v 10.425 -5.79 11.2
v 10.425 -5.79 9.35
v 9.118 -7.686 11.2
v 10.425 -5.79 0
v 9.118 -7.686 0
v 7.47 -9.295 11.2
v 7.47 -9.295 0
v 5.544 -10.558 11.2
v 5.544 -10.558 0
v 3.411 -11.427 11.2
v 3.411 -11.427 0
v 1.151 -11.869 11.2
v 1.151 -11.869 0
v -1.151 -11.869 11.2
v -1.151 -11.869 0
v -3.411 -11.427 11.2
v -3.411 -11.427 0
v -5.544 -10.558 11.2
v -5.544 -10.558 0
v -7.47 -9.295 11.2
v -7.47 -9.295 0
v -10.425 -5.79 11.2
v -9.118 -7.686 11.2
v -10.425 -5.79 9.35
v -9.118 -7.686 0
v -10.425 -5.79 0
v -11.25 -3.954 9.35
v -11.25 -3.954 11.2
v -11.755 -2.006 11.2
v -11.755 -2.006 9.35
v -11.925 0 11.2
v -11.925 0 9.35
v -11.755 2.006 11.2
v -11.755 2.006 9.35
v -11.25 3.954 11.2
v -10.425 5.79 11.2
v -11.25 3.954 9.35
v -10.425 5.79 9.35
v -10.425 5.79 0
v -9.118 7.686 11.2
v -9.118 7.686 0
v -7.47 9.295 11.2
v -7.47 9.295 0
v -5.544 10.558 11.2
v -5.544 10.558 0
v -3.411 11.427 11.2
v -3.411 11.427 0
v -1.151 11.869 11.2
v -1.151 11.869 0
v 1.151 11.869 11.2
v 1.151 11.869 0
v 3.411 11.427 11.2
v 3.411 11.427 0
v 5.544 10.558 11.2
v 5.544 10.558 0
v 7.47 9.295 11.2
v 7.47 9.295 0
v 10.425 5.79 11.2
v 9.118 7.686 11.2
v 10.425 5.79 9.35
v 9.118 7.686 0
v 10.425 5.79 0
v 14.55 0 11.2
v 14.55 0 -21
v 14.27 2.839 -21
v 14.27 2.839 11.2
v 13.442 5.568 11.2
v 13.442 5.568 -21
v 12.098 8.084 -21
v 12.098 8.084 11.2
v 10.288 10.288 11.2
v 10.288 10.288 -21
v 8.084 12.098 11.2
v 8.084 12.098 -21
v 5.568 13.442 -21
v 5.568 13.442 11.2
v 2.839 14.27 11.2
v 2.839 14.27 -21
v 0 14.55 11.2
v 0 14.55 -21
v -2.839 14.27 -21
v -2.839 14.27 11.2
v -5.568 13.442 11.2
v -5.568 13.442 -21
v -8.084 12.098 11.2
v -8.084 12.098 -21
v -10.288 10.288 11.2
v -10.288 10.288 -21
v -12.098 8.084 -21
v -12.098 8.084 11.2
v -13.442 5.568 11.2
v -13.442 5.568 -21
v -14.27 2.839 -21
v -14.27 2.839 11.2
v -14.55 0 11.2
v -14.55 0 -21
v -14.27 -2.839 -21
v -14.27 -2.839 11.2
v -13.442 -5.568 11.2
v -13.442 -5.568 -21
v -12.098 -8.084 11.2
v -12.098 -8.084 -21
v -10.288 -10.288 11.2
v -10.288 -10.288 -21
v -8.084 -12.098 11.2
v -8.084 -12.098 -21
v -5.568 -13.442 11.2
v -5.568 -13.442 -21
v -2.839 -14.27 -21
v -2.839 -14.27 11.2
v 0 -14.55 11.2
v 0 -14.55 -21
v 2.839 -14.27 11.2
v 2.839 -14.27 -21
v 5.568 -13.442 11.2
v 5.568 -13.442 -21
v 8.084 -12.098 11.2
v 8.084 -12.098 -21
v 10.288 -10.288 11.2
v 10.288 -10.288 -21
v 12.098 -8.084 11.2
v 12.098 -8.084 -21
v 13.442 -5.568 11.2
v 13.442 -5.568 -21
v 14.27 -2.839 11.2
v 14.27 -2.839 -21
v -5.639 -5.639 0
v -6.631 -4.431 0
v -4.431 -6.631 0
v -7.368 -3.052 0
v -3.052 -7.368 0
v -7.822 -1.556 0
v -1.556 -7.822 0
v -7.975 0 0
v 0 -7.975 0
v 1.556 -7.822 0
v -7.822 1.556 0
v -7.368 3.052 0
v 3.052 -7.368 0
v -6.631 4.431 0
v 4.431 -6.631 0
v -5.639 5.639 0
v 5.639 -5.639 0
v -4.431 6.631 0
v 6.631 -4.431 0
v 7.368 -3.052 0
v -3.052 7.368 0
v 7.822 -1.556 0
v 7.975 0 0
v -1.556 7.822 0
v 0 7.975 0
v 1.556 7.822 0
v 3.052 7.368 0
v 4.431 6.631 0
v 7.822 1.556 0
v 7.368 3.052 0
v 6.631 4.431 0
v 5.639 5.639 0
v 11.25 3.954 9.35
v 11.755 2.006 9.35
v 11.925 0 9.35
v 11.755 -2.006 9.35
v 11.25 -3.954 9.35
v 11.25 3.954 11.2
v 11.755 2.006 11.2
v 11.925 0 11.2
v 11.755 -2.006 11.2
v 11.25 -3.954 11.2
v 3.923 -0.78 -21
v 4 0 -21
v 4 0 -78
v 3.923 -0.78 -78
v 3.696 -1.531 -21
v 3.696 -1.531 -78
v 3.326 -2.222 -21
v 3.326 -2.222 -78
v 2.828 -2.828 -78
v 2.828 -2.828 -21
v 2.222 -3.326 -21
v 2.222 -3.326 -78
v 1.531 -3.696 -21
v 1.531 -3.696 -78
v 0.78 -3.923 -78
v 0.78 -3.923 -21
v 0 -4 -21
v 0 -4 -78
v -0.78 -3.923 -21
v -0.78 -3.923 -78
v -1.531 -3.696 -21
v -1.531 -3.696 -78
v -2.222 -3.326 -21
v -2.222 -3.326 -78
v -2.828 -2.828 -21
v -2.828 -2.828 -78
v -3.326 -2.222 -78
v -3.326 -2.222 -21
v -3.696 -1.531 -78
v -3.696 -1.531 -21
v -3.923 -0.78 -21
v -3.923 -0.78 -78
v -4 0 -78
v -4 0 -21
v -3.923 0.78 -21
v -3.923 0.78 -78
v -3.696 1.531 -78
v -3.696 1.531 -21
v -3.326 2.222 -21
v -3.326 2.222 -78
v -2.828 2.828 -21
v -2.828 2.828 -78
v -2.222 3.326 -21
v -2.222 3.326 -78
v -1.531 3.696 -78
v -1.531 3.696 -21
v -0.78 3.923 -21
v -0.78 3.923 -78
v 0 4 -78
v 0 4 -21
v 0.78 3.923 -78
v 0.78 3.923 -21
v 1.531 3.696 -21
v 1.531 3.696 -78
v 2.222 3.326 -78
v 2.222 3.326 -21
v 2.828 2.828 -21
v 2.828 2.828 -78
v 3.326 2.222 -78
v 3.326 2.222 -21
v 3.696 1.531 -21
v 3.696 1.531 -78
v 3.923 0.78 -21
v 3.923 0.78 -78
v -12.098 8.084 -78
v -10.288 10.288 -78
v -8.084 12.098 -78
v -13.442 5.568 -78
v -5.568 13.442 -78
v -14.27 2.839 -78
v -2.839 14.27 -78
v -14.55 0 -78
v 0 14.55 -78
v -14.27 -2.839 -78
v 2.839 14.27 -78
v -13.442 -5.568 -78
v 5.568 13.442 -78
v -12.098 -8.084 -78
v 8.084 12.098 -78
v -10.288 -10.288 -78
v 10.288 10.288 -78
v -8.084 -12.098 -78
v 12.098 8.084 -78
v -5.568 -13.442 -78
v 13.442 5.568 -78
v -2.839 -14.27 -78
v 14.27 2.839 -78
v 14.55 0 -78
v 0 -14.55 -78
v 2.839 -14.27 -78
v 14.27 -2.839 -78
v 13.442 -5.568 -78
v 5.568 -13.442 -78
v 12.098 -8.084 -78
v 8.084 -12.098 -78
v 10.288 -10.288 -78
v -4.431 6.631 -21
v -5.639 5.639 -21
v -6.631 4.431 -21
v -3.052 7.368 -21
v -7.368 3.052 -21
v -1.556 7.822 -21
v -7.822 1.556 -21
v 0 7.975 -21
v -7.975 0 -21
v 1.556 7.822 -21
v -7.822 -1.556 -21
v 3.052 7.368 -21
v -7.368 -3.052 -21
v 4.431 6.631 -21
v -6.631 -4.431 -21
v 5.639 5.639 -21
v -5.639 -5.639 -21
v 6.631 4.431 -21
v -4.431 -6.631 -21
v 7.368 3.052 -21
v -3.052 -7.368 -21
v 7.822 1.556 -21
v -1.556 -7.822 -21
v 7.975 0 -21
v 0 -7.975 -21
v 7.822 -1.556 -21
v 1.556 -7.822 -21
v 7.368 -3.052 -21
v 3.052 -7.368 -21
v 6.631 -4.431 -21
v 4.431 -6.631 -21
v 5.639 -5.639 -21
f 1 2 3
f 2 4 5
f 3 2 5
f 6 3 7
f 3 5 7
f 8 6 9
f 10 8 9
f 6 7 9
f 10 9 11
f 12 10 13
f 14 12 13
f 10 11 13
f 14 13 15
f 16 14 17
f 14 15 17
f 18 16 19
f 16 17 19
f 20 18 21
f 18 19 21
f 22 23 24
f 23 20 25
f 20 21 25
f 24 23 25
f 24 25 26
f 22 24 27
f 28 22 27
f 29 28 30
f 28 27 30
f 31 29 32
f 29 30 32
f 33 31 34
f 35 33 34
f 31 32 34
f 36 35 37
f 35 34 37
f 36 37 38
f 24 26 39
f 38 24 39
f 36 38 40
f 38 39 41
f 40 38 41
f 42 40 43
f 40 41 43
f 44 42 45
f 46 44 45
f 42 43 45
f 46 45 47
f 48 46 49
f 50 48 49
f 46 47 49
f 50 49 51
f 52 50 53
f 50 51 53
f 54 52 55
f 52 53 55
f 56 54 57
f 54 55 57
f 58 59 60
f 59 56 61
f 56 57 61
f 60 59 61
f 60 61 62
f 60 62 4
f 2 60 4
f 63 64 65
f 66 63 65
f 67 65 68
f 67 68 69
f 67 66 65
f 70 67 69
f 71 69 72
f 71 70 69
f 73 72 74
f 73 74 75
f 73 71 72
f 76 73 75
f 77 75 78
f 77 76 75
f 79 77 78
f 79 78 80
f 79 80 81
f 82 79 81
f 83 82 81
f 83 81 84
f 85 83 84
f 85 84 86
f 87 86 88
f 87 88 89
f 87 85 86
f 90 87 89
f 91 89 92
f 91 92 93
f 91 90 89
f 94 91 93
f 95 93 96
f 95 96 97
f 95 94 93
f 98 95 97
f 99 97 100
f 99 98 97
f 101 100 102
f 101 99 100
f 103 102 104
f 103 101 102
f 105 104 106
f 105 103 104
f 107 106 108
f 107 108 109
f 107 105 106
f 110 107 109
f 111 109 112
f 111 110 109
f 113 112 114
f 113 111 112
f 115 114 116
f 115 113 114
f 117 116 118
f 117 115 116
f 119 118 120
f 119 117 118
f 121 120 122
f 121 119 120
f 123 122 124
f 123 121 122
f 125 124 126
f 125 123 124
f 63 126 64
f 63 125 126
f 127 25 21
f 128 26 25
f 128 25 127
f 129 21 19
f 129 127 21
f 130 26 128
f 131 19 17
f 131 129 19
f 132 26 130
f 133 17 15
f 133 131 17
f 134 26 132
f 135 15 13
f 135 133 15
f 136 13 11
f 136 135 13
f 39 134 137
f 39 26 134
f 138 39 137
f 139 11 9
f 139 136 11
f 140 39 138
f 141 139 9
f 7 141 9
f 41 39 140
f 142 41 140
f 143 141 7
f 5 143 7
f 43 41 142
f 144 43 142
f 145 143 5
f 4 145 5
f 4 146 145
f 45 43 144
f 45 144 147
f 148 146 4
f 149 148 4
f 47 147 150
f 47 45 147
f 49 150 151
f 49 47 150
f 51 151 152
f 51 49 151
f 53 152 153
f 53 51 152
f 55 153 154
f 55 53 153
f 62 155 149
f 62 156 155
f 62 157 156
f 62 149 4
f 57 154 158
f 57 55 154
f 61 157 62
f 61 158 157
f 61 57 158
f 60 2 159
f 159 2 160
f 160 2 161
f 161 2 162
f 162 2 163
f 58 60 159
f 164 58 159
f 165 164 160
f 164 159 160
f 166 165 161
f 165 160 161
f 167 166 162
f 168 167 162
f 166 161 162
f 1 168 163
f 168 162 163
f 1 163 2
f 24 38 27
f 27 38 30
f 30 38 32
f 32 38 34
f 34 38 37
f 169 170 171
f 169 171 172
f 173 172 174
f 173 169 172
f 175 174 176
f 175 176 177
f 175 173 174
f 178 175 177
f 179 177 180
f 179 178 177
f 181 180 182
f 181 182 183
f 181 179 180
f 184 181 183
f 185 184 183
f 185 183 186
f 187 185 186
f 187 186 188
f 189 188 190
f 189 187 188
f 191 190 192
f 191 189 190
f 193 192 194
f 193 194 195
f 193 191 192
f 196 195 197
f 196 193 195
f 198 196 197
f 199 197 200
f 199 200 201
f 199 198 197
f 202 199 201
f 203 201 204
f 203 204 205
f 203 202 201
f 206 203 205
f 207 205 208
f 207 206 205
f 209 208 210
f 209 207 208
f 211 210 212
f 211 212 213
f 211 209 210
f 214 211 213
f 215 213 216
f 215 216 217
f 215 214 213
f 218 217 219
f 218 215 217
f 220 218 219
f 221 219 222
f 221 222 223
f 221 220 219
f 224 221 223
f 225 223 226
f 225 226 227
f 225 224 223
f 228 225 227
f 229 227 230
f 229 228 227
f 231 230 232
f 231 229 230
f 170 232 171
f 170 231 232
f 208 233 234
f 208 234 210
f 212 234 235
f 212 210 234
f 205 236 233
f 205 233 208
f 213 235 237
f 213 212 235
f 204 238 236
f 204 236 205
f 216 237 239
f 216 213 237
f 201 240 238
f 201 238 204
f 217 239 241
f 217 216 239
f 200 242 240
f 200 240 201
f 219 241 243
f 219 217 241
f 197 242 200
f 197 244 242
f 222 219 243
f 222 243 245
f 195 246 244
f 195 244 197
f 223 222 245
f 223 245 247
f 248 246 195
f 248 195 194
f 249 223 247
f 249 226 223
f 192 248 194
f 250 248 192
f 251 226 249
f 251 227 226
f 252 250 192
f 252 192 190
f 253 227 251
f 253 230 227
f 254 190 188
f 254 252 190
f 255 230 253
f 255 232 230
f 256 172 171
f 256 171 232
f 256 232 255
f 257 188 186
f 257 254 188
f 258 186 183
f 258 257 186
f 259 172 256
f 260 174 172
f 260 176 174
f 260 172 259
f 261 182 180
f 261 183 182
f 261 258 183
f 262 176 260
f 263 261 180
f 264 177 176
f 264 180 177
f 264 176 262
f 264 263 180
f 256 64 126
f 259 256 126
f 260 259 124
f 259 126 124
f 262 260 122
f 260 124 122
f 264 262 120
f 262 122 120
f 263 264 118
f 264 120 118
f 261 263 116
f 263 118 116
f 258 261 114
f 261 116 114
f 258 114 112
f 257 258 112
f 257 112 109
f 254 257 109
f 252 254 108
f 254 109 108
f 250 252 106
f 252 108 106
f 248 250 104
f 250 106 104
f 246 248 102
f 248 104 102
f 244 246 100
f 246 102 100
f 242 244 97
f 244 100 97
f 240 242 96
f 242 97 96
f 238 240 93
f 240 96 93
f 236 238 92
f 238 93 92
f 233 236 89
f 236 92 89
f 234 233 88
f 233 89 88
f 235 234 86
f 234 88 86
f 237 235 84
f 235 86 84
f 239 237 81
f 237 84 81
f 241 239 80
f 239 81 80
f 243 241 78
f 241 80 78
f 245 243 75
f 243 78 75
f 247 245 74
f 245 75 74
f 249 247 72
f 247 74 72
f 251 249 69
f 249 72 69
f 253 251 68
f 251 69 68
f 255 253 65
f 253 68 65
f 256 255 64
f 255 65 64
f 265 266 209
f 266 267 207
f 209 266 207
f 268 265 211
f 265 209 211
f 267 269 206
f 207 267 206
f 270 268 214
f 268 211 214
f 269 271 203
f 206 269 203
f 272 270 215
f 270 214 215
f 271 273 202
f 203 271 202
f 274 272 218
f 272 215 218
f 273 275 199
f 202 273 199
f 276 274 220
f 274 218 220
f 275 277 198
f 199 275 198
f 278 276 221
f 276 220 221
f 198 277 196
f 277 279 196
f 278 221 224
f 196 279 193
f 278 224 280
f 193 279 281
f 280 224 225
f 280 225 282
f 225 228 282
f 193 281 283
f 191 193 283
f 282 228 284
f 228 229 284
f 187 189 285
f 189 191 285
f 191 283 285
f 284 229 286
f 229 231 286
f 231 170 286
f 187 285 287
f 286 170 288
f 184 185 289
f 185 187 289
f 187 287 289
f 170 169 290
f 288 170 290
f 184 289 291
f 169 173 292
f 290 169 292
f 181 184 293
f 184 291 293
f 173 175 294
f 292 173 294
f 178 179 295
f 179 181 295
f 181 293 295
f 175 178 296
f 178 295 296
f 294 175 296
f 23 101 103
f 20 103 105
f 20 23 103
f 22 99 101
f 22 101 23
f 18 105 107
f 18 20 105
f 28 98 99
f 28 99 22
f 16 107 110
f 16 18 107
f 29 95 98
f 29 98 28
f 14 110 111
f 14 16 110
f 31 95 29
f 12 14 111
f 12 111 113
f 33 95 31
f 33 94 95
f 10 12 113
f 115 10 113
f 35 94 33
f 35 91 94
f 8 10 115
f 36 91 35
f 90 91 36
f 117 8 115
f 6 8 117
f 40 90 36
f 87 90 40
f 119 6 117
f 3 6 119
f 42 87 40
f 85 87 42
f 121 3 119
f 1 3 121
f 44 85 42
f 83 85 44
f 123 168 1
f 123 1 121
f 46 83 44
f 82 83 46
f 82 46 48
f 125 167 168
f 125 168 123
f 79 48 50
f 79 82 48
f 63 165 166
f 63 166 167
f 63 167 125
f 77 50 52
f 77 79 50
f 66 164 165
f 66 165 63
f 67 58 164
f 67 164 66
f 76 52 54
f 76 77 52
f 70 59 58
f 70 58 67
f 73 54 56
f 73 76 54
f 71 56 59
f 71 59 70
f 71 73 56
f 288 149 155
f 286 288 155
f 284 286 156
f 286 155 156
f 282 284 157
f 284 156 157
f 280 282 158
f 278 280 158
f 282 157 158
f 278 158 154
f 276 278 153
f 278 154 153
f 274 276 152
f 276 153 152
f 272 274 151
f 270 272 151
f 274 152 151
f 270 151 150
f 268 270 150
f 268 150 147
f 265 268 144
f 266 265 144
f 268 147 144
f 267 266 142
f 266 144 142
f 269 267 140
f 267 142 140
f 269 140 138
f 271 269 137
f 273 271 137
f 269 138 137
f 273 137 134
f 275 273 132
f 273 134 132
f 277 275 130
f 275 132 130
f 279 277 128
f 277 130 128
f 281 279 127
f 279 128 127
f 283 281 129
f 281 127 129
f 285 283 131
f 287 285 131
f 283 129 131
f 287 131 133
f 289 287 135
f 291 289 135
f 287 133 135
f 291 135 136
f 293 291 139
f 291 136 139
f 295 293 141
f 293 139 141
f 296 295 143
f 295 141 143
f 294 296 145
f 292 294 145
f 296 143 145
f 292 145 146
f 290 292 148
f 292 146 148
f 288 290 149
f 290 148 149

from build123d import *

# Parameters (mm, degrees)
F0_R     = 14.55
F1_DEPTH = 11.2
F2_DEPTH = 9.35
F0_R_2   = 7.975
F3_DEPTH = 21
F4_R     = 14.55
F4_R_2   = 4
F5_DEPTH = 57


with BuildPart() as f1:
    # F0 (on Top) → F1 (new body)
    with BuildSketch(Plane.XY):
        Circle(F0_R)
        with BuildLine():
            ThreePointArc((10.425, -5.7900777197), (0, -11.925), (-10.425, -5.7900777197))
            ThreePointArc((-10.425, -5.7900777197), (-11.925, 0), (-10.425, 5.7900777197))
            ThreePointArc((-10.425, 5.7900777197), (0, 11.925), (10.425, 5.7900777197))
            ThreePointArc((10.425, 5.7900777197), (11.925, 0), (10.425, -5.7900777197))
        make_face(mode=Mode.SUBTRACT)
    extrude(amount=F1_DEPTH)

    # F0 (on Top) → F2 (join)
    with BuildSketch(Plane.XY):
        with BuildLine():
            ThreePointArc((-10.425, 5.7900777197), (-11.925, 0), (-10.425, -5.7900777197))
            Line((-10.425, -5.7900777197), (-10.425, 5.7900777197))
        make_face()
        with BuildLine():
            Line((10.425, 5.7900777197), (10.425, -5.7900777197))
            ThreePointArc((10.425, -5.7900777197), (11.925, 0), (10.425, 5.7900777197))
        make_face()
    extrude(amount=F2_DEPTH)

    # F0 (on Top) → F3 (join)
    with BuildSketch(Plane.XY):
        Circle(F0_R)
        with BuildLine():
            ThreePointArc((10.425, -5.7900777197), (0, -11.925), (-10.425, -5.7900777197))
            ThreePointArc((-10.425, -5.7900777197), (-11.925, 0), (-10.425, 5.7900777197))
            ThreePointArc((-10.425, 5.7900777197), (0, 11.925), (10.425, 5.7900777197))
            ThreePointArc((10.425, 5.7900777197), (11.925, 0), (10.425, -5.7900777197))
        make_face(mode=Mode.SUBTRACT)
        with BuildLine():
            Line((-10.425, 5.7900777197), (-10.425, -5.7900777197))
            ThreePointArc((-10.425, -5.7900777197), (0, -11.925), (10.425, -5.7900777197))
            Line((10.425, -5.7900777197), (10.425, 5.7900777197))
            ThreePointArc((10.425, 5.7900777197), (0, 11.925), (-10.425, 5.7900777197))
        make_face()
        Circle(F0_R_2, mode=Mode.SUBTRACT)
        with BuildLine():
            Line((10.425, 5.7900777197), (10.425, -5.7900777197))
            ThreePointArc((10.425, -5.7900777197), (11.925, 0), (10.425, 5.7900777197))
        make_face()
        with BuildLine():
            ThreePointArc((-10.425, 5.7900777197), (-11.925, 0), (-10.425, -5.7900777197))
            Line((-10.425, -5.7900777197), (-10.425, 5.7900777197))
        make_face()
    extrude(amount=-F3_DEPTH)

    # F4 (on face) → F5 (join)
    with BuildSketch(Plane(origin=(0, 0, -21), x_dir=(1, 0, 0), z_dir=(0, 0, -1))):
        Circle(F4_R)
        Circle(F4_R_2, mode=Mode.SUBTRACT)
    extrude(amount=F5_DEPTH)


solid = f1.part
